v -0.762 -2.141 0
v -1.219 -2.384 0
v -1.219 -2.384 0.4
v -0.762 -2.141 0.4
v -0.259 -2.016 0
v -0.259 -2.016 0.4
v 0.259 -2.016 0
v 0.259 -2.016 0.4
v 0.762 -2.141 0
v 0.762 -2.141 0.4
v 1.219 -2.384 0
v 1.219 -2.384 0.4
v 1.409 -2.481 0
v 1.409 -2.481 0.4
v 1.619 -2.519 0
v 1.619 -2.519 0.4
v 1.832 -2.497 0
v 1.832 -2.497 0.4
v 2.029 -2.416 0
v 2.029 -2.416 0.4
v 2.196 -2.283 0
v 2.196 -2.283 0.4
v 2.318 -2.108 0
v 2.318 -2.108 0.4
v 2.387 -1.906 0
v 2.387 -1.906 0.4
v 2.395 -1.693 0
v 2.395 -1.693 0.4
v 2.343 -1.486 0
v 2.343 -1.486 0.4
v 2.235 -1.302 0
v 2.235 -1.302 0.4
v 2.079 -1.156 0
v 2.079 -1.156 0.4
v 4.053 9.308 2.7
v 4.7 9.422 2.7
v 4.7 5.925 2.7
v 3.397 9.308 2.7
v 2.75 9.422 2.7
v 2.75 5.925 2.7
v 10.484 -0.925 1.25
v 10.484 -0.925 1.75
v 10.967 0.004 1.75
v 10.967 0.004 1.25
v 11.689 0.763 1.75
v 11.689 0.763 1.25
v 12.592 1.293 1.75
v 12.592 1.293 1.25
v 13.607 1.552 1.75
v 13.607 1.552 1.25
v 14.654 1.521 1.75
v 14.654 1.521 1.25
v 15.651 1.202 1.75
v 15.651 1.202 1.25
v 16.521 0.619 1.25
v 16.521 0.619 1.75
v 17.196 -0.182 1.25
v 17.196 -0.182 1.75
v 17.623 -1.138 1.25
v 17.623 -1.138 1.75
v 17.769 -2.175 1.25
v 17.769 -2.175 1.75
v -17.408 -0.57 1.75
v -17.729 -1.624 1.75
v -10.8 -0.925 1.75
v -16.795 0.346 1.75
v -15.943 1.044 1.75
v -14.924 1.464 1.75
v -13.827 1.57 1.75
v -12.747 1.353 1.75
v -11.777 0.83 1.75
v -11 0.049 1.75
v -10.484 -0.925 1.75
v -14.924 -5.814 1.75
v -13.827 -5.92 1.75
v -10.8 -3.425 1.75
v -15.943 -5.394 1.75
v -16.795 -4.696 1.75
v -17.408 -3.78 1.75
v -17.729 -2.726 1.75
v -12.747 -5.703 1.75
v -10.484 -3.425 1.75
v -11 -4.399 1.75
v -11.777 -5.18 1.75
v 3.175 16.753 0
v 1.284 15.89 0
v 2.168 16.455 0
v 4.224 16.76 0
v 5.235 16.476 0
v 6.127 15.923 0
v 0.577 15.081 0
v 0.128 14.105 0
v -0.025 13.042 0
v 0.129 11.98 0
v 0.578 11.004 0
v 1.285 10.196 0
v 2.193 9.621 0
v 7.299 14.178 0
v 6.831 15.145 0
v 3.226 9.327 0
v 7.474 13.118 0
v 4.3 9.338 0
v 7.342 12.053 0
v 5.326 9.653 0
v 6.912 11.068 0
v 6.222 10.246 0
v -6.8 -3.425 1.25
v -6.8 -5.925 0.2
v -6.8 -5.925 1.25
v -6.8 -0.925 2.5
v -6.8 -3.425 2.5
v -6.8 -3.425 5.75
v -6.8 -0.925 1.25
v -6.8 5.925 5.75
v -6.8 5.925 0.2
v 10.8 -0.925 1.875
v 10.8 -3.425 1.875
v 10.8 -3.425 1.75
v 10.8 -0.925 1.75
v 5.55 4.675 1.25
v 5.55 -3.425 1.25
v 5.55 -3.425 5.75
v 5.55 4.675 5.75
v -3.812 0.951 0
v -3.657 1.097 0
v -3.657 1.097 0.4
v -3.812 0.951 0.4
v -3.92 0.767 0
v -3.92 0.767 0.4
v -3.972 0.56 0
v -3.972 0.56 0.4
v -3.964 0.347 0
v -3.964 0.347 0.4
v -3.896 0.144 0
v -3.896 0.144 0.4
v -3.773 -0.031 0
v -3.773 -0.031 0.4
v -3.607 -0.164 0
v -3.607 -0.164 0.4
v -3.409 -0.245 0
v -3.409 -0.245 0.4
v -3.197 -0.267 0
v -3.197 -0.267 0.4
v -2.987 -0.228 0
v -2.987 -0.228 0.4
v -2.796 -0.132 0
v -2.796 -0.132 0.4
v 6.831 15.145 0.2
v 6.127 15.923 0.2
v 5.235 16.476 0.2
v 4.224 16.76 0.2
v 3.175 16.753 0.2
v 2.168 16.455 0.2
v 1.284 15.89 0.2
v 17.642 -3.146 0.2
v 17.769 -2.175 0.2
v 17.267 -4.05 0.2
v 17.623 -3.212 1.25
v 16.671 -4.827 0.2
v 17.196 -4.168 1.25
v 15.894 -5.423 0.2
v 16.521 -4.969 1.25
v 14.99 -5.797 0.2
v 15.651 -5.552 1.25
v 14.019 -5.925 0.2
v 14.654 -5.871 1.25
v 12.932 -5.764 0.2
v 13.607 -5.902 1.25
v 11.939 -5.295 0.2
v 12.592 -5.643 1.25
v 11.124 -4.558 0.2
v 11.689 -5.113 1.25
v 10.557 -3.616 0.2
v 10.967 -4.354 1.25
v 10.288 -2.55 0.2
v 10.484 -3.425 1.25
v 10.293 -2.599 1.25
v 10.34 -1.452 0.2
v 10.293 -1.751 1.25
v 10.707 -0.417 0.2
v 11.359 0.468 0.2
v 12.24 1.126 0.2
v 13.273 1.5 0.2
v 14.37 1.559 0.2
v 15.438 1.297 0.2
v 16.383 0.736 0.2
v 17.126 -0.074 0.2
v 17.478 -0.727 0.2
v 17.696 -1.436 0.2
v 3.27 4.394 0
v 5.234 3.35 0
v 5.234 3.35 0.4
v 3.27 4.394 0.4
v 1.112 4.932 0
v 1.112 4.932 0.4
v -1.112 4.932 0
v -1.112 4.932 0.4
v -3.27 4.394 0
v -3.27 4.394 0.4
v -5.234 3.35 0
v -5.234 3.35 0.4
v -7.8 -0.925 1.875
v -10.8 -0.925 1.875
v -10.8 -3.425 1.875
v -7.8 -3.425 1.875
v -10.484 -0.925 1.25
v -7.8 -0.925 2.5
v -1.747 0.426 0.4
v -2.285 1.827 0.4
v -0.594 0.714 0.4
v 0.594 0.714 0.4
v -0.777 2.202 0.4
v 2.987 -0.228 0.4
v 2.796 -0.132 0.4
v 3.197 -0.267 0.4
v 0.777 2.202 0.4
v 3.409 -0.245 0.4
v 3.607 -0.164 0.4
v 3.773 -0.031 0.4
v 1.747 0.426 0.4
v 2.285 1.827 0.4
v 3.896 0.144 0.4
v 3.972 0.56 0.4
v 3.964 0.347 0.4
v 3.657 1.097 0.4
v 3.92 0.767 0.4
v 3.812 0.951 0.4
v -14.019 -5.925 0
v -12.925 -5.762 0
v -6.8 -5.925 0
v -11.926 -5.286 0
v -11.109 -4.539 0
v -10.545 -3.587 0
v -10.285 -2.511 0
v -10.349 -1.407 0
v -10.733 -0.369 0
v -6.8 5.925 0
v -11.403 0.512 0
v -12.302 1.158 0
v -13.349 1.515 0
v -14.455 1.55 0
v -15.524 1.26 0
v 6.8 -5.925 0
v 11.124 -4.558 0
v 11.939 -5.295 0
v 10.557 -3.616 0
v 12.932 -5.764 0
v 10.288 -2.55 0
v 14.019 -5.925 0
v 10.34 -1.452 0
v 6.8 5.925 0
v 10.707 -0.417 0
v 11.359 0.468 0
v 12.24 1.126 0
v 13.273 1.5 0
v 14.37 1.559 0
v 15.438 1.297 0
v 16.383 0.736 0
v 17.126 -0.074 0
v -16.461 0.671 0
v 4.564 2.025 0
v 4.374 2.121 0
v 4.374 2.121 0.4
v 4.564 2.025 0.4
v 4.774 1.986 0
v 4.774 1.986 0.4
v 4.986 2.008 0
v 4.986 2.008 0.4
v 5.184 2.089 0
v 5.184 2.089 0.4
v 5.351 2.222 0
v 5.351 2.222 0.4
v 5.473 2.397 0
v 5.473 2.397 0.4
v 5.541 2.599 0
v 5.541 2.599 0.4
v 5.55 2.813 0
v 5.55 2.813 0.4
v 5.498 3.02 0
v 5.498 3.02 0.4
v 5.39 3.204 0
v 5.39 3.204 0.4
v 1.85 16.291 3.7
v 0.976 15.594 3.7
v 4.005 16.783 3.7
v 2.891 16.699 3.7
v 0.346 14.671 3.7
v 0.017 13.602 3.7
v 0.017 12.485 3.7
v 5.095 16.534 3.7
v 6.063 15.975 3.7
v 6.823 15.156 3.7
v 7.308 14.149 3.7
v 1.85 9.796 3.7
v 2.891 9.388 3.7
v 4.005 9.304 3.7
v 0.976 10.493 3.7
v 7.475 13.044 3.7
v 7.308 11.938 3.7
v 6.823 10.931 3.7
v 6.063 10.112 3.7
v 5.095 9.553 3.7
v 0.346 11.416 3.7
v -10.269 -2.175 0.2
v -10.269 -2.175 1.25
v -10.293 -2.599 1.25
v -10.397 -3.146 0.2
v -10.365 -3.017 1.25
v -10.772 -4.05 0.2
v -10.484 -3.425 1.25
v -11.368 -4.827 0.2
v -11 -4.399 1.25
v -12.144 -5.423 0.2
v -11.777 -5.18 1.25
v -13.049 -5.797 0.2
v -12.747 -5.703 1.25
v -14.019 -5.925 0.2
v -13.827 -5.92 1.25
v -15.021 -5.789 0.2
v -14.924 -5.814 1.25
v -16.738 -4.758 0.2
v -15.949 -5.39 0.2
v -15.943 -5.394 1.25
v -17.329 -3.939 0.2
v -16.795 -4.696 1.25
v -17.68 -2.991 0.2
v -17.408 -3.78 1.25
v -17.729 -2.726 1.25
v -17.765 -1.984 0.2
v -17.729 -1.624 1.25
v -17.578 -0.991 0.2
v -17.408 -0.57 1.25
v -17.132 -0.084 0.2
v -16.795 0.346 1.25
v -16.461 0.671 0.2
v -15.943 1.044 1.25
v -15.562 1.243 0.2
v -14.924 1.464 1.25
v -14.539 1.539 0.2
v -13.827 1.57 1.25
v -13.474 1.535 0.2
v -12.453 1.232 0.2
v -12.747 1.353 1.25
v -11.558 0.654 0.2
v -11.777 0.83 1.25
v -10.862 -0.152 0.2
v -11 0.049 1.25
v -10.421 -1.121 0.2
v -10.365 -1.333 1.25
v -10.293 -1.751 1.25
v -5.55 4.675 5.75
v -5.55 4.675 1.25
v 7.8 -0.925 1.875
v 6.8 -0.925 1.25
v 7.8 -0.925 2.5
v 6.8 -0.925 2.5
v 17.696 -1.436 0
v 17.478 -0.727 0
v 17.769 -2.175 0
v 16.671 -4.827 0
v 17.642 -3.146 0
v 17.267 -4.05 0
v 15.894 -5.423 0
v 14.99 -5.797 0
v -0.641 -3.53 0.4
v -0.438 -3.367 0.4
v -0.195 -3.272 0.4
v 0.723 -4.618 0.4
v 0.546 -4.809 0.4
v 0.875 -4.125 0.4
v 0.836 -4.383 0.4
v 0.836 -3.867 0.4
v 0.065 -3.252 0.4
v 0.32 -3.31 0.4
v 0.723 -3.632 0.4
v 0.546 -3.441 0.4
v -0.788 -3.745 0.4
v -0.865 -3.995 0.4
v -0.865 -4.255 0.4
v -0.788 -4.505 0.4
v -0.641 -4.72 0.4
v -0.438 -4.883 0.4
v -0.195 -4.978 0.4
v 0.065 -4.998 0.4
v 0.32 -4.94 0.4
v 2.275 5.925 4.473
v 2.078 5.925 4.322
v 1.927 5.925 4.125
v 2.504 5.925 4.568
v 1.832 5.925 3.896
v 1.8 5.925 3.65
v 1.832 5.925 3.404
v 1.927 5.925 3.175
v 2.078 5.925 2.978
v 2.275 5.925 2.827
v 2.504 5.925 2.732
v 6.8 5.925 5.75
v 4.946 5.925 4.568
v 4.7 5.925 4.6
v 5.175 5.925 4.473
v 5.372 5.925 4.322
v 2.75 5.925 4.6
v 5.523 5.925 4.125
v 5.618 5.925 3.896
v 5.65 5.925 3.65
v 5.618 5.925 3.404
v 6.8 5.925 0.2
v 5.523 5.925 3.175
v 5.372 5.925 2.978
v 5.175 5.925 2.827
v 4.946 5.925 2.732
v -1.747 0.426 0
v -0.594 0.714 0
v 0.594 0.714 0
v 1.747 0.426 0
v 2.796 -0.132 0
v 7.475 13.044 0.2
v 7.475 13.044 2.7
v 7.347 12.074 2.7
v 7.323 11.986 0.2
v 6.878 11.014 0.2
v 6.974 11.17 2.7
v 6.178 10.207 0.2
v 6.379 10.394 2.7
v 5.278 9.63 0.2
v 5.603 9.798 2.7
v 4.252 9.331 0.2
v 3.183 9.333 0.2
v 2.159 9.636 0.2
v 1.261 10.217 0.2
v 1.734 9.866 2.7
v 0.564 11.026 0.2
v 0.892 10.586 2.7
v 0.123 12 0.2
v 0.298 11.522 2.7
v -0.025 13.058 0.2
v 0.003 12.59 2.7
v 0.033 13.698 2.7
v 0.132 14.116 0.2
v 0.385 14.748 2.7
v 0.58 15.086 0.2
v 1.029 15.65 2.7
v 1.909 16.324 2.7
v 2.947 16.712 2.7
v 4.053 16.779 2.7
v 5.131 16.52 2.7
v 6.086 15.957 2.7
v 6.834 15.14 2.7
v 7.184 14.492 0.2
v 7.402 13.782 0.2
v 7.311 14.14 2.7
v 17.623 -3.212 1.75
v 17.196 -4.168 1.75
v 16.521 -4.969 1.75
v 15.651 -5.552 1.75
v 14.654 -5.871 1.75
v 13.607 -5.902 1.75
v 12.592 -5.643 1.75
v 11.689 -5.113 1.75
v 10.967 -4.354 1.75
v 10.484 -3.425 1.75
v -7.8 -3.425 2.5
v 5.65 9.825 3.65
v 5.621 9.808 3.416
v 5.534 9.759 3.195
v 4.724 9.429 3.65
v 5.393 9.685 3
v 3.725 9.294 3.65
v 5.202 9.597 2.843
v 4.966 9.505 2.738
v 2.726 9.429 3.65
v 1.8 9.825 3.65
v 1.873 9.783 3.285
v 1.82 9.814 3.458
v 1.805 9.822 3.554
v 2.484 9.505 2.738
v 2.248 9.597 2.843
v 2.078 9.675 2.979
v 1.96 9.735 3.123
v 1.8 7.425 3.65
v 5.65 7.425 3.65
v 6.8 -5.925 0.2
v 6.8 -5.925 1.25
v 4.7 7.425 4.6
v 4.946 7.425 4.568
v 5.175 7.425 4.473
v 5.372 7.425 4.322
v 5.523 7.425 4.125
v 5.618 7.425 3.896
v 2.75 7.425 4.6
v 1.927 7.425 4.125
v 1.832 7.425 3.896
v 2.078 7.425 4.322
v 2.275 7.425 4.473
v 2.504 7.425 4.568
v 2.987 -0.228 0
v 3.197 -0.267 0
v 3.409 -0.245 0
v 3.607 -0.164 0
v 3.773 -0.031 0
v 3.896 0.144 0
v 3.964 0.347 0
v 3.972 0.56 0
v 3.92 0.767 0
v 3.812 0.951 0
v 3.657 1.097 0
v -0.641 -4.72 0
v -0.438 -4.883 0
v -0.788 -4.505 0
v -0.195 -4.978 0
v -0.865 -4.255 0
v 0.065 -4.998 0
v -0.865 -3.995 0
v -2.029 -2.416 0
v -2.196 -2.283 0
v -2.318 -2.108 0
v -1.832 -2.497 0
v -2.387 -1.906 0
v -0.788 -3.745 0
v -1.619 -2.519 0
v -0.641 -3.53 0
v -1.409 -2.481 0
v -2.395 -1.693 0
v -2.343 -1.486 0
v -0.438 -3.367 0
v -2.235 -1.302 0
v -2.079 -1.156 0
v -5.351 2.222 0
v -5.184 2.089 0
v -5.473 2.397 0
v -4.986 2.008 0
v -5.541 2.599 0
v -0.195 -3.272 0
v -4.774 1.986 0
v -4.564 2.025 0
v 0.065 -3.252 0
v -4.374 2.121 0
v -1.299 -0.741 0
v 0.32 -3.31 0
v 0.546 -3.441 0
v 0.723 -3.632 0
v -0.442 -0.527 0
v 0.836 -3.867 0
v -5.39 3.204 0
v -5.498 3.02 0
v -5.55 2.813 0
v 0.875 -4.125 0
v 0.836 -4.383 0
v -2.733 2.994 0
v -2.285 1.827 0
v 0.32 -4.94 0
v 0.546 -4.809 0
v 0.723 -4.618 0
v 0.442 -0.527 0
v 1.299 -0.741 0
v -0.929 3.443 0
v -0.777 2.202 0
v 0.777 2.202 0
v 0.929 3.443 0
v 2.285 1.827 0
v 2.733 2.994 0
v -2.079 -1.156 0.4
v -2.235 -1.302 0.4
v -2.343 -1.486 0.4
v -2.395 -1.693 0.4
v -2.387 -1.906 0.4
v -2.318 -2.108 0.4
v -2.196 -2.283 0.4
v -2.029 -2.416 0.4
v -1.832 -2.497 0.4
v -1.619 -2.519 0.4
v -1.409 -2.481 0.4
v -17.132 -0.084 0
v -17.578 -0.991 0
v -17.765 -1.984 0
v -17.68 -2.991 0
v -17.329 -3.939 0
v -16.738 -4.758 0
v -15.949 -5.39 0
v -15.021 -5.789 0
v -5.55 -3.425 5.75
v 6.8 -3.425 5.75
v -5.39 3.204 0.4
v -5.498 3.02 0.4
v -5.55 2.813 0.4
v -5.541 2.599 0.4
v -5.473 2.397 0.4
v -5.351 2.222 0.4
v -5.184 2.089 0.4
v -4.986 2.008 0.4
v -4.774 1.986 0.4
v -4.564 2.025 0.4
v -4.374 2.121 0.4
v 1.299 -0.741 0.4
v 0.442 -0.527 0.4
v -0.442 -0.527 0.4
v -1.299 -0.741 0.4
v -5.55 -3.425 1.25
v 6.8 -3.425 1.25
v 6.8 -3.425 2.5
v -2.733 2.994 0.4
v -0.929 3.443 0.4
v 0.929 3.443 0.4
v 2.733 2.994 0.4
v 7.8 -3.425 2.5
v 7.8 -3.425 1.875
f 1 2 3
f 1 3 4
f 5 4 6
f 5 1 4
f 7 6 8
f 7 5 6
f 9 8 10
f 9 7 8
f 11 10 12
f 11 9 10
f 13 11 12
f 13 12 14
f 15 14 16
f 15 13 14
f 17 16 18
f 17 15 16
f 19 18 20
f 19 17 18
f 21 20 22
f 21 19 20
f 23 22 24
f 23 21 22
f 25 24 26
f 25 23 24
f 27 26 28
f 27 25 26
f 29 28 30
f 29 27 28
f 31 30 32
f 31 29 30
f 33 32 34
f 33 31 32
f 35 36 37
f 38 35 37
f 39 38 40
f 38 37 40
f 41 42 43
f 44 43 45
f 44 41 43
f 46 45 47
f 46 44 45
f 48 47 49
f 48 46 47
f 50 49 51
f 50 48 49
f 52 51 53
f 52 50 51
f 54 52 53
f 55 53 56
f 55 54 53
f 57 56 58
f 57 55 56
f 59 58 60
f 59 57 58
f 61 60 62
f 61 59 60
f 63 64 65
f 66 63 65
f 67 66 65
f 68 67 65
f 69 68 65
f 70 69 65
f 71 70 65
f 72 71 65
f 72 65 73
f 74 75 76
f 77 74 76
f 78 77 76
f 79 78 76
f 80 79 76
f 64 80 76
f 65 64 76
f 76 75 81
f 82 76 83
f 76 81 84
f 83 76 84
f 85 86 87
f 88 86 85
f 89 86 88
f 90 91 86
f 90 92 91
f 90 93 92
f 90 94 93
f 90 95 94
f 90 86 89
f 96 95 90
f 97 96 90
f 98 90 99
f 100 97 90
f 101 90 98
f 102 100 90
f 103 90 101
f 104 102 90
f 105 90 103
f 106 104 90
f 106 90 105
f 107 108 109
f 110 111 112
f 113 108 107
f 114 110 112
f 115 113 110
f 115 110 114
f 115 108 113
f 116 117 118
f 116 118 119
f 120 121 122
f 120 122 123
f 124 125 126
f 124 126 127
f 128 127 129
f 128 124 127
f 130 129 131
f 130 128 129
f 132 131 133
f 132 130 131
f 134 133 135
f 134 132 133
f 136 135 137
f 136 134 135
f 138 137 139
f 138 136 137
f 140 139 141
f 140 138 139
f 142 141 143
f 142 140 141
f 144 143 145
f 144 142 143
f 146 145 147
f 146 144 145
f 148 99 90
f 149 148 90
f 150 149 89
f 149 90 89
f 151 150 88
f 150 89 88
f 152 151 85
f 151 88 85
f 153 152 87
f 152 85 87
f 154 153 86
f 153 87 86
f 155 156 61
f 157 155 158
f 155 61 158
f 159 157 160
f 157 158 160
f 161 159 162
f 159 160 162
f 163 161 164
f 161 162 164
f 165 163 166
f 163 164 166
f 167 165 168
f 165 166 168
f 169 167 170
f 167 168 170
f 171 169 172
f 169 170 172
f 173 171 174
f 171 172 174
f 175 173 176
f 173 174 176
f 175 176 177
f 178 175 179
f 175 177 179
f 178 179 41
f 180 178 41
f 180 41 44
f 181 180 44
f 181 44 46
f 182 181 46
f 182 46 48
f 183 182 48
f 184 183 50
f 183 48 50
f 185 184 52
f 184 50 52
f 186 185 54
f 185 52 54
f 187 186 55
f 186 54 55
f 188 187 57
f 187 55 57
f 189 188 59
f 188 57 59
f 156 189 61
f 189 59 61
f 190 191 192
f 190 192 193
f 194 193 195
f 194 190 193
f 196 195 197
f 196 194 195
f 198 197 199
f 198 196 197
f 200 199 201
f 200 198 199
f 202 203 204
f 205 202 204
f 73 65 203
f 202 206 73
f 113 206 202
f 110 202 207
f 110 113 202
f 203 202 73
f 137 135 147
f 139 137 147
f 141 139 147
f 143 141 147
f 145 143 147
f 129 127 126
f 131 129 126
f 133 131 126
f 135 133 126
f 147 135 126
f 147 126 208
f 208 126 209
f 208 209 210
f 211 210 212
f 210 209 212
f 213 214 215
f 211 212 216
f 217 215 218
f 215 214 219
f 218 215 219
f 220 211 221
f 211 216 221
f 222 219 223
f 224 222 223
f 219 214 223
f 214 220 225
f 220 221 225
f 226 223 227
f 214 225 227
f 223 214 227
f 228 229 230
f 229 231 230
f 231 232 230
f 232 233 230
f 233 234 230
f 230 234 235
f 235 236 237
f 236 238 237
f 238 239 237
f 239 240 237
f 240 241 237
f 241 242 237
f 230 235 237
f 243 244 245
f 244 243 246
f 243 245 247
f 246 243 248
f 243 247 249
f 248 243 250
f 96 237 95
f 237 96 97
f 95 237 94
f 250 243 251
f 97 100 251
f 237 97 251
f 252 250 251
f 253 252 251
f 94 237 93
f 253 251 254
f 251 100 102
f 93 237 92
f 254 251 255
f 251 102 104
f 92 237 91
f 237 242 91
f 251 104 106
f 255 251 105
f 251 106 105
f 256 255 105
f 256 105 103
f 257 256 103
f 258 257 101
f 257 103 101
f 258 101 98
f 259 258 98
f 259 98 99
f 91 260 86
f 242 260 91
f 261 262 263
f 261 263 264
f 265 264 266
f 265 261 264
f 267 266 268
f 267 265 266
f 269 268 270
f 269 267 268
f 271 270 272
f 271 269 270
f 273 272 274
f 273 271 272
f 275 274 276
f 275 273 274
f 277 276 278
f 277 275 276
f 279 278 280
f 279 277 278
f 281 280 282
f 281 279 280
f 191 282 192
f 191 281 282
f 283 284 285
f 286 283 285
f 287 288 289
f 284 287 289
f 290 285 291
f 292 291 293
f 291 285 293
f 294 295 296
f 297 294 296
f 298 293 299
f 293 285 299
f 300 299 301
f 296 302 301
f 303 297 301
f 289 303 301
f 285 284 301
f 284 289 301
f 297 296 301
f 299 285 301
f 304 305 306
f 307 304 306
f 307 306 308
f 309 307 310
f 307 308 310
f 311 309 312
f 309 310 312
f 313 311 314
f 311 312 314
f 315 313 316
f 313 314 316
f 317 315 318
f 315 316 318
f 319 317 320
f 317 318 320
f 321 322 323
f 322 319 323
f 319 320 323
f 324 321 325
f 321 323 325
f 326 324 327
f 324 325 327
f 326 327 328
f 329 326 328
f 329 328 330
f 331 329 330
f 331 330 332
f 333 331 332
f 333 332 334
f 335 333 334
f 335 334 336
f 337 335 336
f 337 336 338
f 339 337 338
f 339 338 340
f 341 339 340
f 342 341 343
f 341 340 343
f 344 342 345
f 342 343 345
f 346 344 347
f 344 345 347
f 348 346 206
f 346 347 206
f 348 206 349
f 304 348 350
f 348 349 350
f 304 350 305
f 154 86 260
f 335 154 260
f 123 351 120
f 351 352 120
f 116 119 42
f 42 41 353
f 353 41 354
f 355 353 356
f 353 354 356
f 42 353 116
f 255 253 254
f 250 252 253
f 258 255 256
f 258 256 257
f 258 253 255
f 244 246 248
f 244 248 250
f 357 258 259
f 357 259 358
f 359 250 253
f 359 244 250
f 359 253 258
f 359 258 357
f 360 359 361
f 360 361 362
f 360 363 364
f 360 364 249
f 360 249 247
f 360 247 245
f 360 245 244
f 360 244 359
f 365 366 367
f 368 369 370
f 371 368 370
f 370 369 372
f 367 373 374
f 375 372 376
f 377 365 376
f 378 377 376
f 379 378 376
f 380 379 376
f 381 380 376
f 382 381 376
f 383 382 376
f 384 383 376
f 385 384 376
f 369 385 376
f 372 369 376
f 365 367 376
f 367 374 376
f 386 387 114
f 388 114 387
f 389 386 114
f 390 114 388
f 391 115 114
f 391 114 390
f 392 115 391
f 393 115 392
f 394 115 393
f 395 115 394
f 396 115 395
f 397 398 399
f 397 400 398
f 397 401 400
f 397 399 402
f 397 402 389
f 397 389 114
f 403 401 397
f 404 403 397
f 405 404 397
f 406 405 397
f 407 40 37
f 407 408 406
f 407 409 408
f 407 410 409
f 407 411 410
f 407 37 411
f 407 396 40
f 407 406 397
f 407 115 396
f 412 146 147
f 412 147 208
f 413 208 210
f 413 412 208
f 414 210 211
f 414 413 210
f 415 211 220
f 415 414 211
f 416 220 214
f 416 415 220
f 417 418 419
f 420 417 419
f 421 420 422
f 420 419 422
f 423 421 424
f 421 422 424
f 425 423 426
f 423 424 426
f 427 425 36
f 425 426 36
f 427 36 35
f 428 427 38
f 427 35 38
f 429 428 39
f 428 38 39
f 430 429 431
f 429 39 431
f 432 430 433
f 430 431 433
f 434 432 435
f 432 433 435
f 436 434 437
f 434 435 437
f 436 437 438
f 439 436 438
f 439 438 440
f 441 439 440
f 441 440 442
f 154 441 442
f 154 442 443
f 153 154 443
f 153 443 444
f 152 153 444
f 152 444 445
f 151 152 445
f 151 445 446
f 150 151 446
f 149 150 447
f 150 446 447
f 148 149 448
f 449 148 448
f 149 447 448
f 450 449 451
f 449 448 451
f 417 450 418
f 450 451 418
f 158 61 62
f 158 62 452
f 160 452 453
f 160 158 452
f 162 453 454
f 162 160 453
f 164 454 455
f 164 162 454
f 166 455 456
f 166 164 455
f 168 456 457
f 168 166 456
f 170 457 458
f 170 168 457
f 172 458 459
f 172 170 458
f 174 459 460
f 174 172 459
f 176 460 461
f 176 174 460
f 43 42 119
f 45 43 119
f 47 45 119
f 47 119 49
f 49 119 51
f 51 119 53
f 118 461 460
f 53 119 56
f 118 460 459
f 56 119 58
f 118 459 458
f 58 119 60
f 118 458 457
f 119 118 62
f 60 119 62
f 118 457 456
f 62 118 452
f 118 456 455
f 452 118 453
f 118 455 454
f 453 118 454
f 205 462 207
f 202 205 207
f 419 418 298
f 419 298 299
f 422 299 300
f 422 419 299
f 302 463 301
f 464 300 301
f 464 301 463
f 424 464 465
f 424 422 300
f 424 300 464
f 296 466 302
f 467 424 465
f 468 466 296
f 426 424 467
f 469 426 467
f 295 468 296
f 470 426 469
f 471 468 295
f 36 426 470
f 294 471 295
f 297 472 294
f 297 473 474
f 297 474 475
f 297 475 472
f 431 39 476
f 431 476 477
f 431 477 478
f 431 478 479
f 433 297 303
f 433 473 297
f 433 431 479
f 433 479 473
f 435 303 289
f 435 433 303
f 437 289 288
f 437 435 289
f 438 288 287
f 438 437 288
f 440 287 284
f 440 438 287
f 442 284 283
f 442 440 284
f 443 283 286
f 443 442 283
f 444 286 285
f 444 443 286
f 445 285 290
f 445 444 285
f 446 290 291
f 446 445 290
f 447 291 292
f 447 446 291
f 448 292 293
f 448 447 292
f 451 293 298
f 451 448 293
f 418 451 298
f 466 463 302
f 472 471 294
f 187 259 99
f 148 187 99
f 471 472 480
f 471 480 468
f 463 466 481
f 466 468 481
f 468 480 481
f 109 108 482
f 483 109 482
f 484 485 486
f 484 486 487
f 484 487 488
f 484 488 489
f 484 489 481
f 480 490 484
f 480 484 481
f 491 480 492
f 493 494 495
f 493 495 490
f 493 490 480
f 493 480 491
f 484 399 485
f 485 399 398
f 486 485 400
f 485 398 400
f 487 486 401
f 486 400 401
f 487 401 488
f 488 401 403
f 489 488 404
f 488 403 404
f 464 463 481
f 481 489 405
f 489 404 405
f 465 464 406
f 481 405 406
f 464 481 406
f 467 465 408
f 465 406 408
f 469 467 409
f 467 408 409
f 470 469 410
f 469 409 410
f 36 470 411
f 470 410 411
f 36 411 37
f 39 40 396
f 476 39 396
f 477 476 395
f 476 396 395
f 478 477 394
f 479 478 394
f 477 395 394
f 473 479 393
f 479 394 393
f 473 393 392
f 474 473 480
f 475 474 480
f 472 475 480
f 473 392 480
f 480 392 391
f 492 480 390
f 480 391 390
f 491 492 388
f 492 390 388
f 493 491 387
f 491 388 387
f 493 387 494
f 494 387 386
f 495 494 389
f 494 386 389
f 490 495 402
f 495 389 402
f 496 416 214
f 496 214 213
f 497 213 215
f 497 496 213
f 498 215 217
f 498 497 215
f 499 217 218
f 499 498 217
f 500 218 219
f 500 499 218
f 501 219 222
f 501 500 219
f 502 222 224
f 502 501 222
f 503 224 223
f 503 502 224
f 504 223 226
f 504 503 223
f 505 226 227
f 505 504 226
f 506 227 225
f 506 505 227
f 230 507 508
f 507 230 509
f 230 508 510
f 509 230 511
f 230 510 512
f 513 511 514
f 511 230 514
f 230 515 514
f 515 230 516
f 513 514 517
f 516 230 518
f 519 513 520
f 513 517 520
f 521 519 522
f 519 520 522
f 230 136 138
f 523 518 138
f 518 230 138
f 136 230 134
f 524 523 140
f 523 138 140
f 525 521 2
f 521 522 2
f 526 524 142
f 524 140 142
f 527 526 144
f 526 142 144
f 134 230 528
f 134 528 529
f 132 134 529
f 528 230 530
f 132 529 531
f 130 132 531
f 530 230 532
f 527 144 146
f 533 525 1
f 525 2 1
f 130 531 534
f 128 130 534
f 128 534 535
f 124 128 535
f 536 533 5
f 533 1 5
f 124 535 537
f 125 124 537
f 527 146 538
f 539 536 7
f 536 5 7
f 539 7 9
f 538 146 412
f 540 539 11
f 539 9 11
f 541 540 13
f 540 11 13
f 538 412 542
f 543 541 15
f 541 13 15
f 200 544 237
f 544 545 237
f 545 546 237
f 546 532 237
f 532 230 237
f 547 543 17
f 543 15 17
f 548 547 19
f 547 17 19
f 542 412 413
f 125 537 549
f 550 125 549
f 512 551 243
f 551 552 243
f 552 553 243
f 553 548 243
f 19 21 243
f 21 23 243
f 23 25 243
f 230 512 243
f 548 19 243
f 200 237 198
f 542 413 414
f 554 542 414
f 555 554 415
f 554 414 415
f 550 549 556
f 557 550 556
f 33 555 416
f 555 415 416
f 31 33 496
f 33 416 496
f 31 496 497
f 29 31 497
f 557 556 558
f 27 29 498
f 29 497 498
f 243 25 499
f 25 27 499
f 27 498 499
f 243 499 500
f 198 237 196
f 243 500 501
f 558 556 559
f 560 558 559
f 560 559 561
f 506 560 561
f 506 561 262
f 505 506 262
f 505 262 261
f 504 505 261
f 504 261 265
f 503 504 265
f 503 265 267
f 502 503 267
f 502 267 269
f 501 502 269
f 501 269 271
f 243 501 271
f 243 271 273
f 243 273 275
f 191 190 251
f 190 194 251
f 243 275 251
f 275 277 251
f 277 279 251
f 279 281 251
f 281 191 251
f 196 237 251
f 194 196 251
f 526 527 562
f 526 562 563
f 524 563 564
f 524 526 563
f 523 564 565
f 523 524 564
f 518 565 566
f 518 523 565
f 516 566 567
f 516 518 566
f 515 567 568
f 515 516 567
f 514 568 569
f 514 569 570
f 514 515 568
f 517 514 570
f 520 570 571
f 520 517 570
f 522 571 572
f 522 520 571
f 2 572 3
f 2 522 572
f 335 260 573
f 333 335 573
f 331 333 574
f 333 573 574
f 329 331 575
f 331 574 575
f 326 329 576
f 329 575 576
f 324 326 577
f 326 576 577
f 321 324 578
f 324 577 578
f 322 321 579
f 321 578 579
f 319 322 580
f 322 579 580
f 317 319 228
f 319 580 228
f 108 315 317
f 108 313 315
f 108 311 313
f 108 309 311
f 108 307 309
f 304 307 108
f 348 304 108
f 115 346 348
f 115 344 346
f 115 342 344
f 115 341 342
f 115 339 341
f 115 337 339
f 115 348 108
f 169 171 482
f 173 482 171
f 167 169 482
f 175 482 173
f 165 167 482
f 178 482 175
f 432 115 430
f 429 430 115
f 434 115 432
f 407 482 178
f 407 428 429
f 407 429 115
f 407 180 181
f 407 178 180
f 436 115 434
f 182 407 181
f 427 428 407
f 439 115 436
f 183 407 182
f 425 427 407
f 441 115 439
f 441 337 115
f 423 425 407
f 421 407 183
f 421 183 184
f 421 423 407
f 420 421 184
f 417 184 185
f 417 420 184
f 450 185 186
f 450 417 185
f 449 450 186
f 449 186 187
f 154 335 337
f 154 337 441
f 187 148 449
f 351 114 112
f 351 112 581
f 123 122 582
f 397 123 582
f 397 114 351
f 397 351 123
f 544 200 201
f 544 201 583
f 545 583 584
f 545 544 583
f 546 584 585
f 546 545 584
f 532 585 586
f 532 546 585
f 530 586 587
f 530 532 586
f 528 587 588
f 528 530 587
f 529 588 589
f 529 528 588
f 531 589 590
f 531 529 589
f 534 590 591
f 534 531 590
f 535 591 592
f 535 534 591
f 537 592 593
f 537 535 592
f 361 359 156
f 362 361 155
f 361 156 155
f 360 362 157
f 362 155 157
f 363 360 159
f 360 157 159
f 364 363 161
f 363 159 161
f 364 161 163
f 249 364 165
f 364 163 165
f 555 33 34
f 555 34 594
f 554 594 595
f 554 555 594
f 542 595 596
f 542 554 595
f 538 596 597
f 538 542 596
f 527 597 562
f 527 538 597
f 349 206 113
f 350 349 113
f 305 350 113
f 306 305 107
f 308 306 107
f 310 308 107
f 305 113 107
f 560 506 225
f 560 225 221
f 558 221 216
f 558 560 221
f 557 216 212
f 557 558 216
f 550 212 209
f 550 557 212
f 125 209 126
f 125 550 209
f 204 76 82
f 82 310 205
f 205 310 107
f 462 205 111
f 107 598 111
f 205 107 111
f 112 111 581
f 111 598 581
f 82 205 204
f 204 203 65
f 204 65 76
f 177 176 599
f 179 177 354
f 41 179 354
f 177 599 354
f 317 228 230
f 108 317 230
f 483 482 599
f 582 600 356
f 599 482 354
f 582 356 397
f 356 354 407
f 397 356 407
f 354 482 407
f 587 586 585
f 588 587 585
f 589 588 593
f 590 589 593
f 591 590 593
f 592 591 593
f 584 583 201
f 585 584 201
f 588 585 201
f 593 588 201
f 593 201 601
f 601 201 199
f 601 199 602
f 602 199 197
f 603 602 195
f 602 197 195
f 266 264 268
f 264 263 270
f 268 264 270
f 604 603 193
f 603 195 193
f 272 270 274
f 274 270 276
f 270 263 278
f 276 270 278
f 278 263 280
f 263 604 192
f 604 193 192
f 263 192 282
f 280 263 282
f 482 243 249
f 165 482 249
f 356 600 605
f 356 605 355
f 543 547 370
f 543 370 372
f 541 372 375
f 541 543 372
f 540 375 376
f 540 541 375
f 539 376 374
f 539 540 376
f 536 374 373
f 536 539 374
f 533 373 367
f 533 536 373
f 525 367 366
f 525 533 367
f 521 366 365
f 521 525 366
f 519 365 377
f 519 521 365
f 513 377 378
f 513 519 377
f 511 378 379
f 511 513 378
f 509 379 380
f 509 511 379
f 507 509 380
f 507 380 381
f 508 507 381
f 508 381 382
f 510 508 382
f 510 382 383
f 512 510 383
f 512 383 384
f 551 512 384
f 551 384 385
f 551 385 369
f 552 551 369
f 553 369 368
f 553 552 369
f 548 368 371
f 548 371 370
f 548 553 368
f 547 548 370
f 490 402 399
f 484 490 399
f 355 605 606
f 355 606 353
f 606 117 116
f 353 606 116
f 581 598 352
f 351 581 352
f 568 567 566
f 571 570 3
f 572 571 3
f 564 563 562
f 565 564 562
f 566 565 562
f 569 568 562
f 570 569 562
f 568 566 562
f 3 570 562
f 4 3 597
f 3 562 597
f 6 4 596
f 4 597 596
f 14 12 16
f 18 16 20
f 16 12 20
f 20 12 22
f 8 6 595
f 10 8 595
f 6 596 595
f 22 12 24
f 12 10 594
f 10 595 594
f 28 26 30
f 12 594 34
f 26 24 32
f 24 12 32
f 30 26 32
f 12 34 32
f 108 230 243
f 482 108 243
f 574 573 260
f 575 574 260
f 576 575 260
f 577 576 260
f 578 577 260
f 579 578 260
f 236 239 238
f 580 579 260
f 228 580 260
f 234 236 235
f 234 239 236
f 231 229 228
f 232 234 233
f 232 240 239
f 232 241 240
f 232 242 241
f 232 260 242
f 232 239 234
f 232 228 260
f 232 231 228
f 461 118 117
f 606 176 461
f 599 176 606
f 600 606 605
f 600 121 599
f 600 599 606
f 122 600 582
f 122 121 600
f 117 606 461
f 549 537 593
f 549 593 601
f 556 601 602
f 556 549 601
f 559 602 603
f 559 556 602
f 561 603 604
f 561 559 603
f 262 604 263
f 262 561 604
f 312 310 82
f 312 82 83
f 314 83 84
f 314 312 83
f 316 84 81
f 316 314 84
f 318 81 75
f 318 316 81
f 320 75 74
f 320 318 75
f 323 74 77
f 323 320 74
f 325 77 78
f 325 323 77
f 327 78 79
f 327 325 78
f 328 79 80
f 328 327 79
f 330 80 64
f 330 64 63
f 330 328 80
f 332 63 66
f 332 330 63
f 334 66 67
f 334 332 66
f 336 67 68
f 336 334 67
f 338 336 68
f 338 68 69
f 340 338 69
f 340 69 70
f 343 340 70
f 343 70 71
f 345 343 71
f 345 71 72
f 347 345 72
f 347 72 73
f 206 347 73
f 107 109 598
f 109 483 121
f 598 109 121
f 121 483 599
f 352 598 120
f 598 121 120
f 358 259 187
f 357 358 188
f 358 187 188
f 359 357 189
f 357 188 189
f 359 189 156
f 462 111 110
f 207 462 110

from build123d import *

# Parameters (mm, degrees)
F0_W           = 13.6
F0_H           = 11.85
F1_DEPTH       = 5.75
F2_T           = -1.25
F3_W           = 2.5
F3_H           = 1.25
F4_DEPTH       = 1
F6_W           = 5
F6_H           = 1.15
F7_DEPTH       = 1.5
F9_DEPTH       = 1.5
F10_W          = 4.3600509252
F10_H          = 4.6871736337
F11_DEPTH      = 7.801
F11_DEPTH_BACK = 7.801
F13_W          = 2.5
F13_H          = 0.625
F14_DEPTH      = 3
F15_W          = 2.5
F15_H          = 0.625
F16_DEPTH      = 3
F18_DEPTH      = 3
F19_R          = 3.75
F20_DEPTH      = 1.25
F20_DEPTH_BACK = 0.5
F21_R          = 3.75
F22_DEPTH      = 2.7
F22_DEPTH_BACK = 1
F24_DEPTH      = 0.2
F12_R          = 0.875
F25_DEPTH      = 0.4


with BuildPart() as f1:
    # F0 (on Top) → F1 (new body)
    with BuildSketch(Plane.XY):
        Rectangle(F0_W, F0_H)
    extrude(amount=F1_DEPTH)

    # F2
    f2_openings = [f1.faces().sort_by_distance(p)[0] for p in [
        (0, 0, 5.75),
    ]]
    offset(amount=F2_T, openings=f2_openings)

    # F3 (on face) → F4 (join)
    with BuildSketch(Plane.YZ.offset(6.8)):
        with Locations((-2.175, 1.875)):
            Rectangle(F3_W, F3_H)
    extrude(amount=F4_DEPTH)

    # F5: F1 across plane


with BuildPart() as f1_1:
    add(f1.part)
    add(f1.part.mirror(Plane.YZ))

    # F6 (on face) → F7 (join)
    with BuildSketch(Plane.XZ.offset(5.925)):
        with Locations((0, 3.075)):
            Rectangle(F6_W, F6_H)
    extrude(amount=F7_DEPTH)

    # F8 (on face) → F9 (join)
    with BuildSketch(Plane(origin=(0, 5.925, 0), x_dir=(-1, 0, 0), z_dir=(0, 1, 0))):
        with BuildLine():
            Line((-4.7, 2.7), (-2.75, 2.7))
            ThreePointArc((-2.75, 2.7), (-2.0782485579, 2.9782485579), (-1.8, 3.65))
            ThreePointArc((-1.8, 3.65), (-2.0782485579, 4.3217514421), (-2.75, 4.6))
            Line((-2.75, 4.6), (-4.7, 4.6))
            ThreePointArc((-4.7, 4.6), (-5.3717514421, 4.3217514421), (-5.65, 3.65))
            ThreePointArc((-5.65, 3.65), (-5.3717514421, 2.9782485579), (-4.7, 2.7))
        make_face()
    extrude(amount=F9_DEPTH)

    # F10 (on Right) → F11 (cut, two sides)
    with BuildSketch(Plane.YZ) as f11_sk:
        with Locations((-5.6050254626, 3.5935868168)):
            Rectangle(F10_W, F10_H)
    extrude(amount=-F11_DEPTH, mode=Mode.SUBTRACT)
    extrude(f11_sk.sketch, amount=F11_DEPTH_BACK, mode=Mode.SUBTRACT)

    # F13 (on face) → F14 (join)
    with BuildSketch(Plane.YZ.offset(7.8)):
        with Locations((-2.175, 1.5625)):
            Rectangle(F13_W, F13_H)
    extrude(amount=F14_DEPTH)

    # F15 (on face) → F16 (join)
    with BuildSketch(Plane(origin=(-7.8, 0, 0), x_dir=(0, -1, 0), z_dir=(-1, 0, 0))):
        with Locations((2.175, 1.5625)):
            Rectangle(F15_W, F15_H)
    extrude(amount=F16_DEPTH)

    # F17 (on face) → F18 (join)
    with BuildSketch(Plane(origin=(0, 7.425, 0), x_dir=(-1, 0, 0), z_dir=(0, 1, 0))):
        with BuildLine():
            Line((-4.7, 2.7), (-2.75, 2.7))
            ThreePointArc((-2.75, 2.7), (-2.0782485579, 2.9782485579), (-1.8, 3.65))
            Line((-1.8, 3.65), (-5.65, 3.65))
            ThreePointArc((-5.65, 3.65), (-5.3717514421, 2.9782485579), (-4.7, 2.7))
        make_face()
    extrude(amount=F18_DEPTH)

    # F19 (on face) → F20 (join, two sides)
    with BuildSketch(Plane(origin=(0, 0, 1.25), x_dir=(1, 0, 0), z_dir=(0, 0, -1))) as f20_sk:
        with Locations((-14.0194073319, 2.175)):
            Circle(F19_R)
        with Locations((14.0194073319, 2.175)):
            Circle(F19_R)
    extrude(amount=F20_DEPTH)
    extrude(f20_sk.sketch, amount=-F20_DEPTH_BACK)

    # F21 (on face) → F22 (join, two sides)
    with BuildSketch(Plane(origin=(0, 0, 2.7), x_dir=(1, 0, 0), z_dir=(0, 0, -1))) as f22_sk:
        with Locations((3.725, -13.0435097963)):
            Circle(F21_R)
    extrude(amount=F22_DEPTH)
    extrude(f22_sk.sketch, amount=-F22_DEPTH_BACK)

    # F23 (on Top) → F24 (join)
    with BuildSketch(Plane.XY):
        with BuildLine():
            Line((1.2836985293, 15.8900071403), (-16.4607088026, 0.6714973441))
            ThreePointArc((-16.4607088026, 0.6714973441), (-17.536285567, -3.4765634752), (-14.0194073319, -5.925))
            Line((-14.0194073319, -5.925), (14.0194073319, -5.925))
            ThreePointArc((14.0194073319, -5.925), (17.3316275311, -3.9333223118), (17.1255143602, -0.0739052545))
            Line((17.1255143602, -0.0739052545), (6.8311070282, 15.1446045417))
            ThreePointArc((6.8311070282, 15.1446045417), (4.2243975028, 16.7601079901), (1.2836985293, 15.8900071403))
        make_face()
    extrude(amount=F24_DEPTH)

    # F12 (on Top) → F25 (cut)
    with BuildSketch(Plane.XY):
        with Locations((0, -4.125)):
            Circle(F12_R)
        with BuildLine():
            ThreePointArc((4.3735203272, 2.1210343377), (5.4180666877, 2.3052160437), (5.2338849817, 3.3497624041))
            ThreePointArc((5.2338849817, 3.3497624041), (0, 5), (-5.2338849817, 3.3497624041))
            ThreePointArc((-5.2338849817, 3.3497624041), (-5.4180666877, 2.3052160437), (-4.3735203272, 2.1210343377))
            ThreePointArc((-4.3735203272, 2.1210343377), (0, 3.5), (4.3735203272, 2.1210343377))
        make_face()
        with BuildLine():
            ThreePointArc((2.7961851272, -0.1316337841), (3.8407314877, 0.0525479219), (3.6565497817, 1.0970942823))
            ThreePointArc((3.6565497817, 1.0970942823), (0, 2.25), (-3.6565497817, 1.0970942823))
            ThreePointArc((-3.6565497817, 1.0970942823), (-3.8407314877, 0.0525479219), (-2.7961851272, -0.1316337841))
            ThreePointArc((-2.7961851272, -0.1316337841), (0, 0.75), (2.7961851272, -0.1316337841))
        make_face()
        with BuildLine():
            ThreePointArc((1.2188499272, -2.3843019059), (2.2633962877, -2.2001201999), (2.0792145818, -1.1555738395))
            ThreePointArc((2.0792145818, -1.1555738395), (0, -0.5), (-2.0792145818, -1.1555738395))
            ThreePointArc((-2.0792145818, -1.1555738395), (-2.2633962877, -2.2001201999), (-1.2188499272, -2.3843019059))
            ThreePointArc((-1.2188499272, -2.3843019059), (0, -2), (1.2188499272, -2.3843019059))
        make_face()
    extrude(amount=F25_DEPTH, mode=Mode.SUBTRACT)


solid = f1_1.part
